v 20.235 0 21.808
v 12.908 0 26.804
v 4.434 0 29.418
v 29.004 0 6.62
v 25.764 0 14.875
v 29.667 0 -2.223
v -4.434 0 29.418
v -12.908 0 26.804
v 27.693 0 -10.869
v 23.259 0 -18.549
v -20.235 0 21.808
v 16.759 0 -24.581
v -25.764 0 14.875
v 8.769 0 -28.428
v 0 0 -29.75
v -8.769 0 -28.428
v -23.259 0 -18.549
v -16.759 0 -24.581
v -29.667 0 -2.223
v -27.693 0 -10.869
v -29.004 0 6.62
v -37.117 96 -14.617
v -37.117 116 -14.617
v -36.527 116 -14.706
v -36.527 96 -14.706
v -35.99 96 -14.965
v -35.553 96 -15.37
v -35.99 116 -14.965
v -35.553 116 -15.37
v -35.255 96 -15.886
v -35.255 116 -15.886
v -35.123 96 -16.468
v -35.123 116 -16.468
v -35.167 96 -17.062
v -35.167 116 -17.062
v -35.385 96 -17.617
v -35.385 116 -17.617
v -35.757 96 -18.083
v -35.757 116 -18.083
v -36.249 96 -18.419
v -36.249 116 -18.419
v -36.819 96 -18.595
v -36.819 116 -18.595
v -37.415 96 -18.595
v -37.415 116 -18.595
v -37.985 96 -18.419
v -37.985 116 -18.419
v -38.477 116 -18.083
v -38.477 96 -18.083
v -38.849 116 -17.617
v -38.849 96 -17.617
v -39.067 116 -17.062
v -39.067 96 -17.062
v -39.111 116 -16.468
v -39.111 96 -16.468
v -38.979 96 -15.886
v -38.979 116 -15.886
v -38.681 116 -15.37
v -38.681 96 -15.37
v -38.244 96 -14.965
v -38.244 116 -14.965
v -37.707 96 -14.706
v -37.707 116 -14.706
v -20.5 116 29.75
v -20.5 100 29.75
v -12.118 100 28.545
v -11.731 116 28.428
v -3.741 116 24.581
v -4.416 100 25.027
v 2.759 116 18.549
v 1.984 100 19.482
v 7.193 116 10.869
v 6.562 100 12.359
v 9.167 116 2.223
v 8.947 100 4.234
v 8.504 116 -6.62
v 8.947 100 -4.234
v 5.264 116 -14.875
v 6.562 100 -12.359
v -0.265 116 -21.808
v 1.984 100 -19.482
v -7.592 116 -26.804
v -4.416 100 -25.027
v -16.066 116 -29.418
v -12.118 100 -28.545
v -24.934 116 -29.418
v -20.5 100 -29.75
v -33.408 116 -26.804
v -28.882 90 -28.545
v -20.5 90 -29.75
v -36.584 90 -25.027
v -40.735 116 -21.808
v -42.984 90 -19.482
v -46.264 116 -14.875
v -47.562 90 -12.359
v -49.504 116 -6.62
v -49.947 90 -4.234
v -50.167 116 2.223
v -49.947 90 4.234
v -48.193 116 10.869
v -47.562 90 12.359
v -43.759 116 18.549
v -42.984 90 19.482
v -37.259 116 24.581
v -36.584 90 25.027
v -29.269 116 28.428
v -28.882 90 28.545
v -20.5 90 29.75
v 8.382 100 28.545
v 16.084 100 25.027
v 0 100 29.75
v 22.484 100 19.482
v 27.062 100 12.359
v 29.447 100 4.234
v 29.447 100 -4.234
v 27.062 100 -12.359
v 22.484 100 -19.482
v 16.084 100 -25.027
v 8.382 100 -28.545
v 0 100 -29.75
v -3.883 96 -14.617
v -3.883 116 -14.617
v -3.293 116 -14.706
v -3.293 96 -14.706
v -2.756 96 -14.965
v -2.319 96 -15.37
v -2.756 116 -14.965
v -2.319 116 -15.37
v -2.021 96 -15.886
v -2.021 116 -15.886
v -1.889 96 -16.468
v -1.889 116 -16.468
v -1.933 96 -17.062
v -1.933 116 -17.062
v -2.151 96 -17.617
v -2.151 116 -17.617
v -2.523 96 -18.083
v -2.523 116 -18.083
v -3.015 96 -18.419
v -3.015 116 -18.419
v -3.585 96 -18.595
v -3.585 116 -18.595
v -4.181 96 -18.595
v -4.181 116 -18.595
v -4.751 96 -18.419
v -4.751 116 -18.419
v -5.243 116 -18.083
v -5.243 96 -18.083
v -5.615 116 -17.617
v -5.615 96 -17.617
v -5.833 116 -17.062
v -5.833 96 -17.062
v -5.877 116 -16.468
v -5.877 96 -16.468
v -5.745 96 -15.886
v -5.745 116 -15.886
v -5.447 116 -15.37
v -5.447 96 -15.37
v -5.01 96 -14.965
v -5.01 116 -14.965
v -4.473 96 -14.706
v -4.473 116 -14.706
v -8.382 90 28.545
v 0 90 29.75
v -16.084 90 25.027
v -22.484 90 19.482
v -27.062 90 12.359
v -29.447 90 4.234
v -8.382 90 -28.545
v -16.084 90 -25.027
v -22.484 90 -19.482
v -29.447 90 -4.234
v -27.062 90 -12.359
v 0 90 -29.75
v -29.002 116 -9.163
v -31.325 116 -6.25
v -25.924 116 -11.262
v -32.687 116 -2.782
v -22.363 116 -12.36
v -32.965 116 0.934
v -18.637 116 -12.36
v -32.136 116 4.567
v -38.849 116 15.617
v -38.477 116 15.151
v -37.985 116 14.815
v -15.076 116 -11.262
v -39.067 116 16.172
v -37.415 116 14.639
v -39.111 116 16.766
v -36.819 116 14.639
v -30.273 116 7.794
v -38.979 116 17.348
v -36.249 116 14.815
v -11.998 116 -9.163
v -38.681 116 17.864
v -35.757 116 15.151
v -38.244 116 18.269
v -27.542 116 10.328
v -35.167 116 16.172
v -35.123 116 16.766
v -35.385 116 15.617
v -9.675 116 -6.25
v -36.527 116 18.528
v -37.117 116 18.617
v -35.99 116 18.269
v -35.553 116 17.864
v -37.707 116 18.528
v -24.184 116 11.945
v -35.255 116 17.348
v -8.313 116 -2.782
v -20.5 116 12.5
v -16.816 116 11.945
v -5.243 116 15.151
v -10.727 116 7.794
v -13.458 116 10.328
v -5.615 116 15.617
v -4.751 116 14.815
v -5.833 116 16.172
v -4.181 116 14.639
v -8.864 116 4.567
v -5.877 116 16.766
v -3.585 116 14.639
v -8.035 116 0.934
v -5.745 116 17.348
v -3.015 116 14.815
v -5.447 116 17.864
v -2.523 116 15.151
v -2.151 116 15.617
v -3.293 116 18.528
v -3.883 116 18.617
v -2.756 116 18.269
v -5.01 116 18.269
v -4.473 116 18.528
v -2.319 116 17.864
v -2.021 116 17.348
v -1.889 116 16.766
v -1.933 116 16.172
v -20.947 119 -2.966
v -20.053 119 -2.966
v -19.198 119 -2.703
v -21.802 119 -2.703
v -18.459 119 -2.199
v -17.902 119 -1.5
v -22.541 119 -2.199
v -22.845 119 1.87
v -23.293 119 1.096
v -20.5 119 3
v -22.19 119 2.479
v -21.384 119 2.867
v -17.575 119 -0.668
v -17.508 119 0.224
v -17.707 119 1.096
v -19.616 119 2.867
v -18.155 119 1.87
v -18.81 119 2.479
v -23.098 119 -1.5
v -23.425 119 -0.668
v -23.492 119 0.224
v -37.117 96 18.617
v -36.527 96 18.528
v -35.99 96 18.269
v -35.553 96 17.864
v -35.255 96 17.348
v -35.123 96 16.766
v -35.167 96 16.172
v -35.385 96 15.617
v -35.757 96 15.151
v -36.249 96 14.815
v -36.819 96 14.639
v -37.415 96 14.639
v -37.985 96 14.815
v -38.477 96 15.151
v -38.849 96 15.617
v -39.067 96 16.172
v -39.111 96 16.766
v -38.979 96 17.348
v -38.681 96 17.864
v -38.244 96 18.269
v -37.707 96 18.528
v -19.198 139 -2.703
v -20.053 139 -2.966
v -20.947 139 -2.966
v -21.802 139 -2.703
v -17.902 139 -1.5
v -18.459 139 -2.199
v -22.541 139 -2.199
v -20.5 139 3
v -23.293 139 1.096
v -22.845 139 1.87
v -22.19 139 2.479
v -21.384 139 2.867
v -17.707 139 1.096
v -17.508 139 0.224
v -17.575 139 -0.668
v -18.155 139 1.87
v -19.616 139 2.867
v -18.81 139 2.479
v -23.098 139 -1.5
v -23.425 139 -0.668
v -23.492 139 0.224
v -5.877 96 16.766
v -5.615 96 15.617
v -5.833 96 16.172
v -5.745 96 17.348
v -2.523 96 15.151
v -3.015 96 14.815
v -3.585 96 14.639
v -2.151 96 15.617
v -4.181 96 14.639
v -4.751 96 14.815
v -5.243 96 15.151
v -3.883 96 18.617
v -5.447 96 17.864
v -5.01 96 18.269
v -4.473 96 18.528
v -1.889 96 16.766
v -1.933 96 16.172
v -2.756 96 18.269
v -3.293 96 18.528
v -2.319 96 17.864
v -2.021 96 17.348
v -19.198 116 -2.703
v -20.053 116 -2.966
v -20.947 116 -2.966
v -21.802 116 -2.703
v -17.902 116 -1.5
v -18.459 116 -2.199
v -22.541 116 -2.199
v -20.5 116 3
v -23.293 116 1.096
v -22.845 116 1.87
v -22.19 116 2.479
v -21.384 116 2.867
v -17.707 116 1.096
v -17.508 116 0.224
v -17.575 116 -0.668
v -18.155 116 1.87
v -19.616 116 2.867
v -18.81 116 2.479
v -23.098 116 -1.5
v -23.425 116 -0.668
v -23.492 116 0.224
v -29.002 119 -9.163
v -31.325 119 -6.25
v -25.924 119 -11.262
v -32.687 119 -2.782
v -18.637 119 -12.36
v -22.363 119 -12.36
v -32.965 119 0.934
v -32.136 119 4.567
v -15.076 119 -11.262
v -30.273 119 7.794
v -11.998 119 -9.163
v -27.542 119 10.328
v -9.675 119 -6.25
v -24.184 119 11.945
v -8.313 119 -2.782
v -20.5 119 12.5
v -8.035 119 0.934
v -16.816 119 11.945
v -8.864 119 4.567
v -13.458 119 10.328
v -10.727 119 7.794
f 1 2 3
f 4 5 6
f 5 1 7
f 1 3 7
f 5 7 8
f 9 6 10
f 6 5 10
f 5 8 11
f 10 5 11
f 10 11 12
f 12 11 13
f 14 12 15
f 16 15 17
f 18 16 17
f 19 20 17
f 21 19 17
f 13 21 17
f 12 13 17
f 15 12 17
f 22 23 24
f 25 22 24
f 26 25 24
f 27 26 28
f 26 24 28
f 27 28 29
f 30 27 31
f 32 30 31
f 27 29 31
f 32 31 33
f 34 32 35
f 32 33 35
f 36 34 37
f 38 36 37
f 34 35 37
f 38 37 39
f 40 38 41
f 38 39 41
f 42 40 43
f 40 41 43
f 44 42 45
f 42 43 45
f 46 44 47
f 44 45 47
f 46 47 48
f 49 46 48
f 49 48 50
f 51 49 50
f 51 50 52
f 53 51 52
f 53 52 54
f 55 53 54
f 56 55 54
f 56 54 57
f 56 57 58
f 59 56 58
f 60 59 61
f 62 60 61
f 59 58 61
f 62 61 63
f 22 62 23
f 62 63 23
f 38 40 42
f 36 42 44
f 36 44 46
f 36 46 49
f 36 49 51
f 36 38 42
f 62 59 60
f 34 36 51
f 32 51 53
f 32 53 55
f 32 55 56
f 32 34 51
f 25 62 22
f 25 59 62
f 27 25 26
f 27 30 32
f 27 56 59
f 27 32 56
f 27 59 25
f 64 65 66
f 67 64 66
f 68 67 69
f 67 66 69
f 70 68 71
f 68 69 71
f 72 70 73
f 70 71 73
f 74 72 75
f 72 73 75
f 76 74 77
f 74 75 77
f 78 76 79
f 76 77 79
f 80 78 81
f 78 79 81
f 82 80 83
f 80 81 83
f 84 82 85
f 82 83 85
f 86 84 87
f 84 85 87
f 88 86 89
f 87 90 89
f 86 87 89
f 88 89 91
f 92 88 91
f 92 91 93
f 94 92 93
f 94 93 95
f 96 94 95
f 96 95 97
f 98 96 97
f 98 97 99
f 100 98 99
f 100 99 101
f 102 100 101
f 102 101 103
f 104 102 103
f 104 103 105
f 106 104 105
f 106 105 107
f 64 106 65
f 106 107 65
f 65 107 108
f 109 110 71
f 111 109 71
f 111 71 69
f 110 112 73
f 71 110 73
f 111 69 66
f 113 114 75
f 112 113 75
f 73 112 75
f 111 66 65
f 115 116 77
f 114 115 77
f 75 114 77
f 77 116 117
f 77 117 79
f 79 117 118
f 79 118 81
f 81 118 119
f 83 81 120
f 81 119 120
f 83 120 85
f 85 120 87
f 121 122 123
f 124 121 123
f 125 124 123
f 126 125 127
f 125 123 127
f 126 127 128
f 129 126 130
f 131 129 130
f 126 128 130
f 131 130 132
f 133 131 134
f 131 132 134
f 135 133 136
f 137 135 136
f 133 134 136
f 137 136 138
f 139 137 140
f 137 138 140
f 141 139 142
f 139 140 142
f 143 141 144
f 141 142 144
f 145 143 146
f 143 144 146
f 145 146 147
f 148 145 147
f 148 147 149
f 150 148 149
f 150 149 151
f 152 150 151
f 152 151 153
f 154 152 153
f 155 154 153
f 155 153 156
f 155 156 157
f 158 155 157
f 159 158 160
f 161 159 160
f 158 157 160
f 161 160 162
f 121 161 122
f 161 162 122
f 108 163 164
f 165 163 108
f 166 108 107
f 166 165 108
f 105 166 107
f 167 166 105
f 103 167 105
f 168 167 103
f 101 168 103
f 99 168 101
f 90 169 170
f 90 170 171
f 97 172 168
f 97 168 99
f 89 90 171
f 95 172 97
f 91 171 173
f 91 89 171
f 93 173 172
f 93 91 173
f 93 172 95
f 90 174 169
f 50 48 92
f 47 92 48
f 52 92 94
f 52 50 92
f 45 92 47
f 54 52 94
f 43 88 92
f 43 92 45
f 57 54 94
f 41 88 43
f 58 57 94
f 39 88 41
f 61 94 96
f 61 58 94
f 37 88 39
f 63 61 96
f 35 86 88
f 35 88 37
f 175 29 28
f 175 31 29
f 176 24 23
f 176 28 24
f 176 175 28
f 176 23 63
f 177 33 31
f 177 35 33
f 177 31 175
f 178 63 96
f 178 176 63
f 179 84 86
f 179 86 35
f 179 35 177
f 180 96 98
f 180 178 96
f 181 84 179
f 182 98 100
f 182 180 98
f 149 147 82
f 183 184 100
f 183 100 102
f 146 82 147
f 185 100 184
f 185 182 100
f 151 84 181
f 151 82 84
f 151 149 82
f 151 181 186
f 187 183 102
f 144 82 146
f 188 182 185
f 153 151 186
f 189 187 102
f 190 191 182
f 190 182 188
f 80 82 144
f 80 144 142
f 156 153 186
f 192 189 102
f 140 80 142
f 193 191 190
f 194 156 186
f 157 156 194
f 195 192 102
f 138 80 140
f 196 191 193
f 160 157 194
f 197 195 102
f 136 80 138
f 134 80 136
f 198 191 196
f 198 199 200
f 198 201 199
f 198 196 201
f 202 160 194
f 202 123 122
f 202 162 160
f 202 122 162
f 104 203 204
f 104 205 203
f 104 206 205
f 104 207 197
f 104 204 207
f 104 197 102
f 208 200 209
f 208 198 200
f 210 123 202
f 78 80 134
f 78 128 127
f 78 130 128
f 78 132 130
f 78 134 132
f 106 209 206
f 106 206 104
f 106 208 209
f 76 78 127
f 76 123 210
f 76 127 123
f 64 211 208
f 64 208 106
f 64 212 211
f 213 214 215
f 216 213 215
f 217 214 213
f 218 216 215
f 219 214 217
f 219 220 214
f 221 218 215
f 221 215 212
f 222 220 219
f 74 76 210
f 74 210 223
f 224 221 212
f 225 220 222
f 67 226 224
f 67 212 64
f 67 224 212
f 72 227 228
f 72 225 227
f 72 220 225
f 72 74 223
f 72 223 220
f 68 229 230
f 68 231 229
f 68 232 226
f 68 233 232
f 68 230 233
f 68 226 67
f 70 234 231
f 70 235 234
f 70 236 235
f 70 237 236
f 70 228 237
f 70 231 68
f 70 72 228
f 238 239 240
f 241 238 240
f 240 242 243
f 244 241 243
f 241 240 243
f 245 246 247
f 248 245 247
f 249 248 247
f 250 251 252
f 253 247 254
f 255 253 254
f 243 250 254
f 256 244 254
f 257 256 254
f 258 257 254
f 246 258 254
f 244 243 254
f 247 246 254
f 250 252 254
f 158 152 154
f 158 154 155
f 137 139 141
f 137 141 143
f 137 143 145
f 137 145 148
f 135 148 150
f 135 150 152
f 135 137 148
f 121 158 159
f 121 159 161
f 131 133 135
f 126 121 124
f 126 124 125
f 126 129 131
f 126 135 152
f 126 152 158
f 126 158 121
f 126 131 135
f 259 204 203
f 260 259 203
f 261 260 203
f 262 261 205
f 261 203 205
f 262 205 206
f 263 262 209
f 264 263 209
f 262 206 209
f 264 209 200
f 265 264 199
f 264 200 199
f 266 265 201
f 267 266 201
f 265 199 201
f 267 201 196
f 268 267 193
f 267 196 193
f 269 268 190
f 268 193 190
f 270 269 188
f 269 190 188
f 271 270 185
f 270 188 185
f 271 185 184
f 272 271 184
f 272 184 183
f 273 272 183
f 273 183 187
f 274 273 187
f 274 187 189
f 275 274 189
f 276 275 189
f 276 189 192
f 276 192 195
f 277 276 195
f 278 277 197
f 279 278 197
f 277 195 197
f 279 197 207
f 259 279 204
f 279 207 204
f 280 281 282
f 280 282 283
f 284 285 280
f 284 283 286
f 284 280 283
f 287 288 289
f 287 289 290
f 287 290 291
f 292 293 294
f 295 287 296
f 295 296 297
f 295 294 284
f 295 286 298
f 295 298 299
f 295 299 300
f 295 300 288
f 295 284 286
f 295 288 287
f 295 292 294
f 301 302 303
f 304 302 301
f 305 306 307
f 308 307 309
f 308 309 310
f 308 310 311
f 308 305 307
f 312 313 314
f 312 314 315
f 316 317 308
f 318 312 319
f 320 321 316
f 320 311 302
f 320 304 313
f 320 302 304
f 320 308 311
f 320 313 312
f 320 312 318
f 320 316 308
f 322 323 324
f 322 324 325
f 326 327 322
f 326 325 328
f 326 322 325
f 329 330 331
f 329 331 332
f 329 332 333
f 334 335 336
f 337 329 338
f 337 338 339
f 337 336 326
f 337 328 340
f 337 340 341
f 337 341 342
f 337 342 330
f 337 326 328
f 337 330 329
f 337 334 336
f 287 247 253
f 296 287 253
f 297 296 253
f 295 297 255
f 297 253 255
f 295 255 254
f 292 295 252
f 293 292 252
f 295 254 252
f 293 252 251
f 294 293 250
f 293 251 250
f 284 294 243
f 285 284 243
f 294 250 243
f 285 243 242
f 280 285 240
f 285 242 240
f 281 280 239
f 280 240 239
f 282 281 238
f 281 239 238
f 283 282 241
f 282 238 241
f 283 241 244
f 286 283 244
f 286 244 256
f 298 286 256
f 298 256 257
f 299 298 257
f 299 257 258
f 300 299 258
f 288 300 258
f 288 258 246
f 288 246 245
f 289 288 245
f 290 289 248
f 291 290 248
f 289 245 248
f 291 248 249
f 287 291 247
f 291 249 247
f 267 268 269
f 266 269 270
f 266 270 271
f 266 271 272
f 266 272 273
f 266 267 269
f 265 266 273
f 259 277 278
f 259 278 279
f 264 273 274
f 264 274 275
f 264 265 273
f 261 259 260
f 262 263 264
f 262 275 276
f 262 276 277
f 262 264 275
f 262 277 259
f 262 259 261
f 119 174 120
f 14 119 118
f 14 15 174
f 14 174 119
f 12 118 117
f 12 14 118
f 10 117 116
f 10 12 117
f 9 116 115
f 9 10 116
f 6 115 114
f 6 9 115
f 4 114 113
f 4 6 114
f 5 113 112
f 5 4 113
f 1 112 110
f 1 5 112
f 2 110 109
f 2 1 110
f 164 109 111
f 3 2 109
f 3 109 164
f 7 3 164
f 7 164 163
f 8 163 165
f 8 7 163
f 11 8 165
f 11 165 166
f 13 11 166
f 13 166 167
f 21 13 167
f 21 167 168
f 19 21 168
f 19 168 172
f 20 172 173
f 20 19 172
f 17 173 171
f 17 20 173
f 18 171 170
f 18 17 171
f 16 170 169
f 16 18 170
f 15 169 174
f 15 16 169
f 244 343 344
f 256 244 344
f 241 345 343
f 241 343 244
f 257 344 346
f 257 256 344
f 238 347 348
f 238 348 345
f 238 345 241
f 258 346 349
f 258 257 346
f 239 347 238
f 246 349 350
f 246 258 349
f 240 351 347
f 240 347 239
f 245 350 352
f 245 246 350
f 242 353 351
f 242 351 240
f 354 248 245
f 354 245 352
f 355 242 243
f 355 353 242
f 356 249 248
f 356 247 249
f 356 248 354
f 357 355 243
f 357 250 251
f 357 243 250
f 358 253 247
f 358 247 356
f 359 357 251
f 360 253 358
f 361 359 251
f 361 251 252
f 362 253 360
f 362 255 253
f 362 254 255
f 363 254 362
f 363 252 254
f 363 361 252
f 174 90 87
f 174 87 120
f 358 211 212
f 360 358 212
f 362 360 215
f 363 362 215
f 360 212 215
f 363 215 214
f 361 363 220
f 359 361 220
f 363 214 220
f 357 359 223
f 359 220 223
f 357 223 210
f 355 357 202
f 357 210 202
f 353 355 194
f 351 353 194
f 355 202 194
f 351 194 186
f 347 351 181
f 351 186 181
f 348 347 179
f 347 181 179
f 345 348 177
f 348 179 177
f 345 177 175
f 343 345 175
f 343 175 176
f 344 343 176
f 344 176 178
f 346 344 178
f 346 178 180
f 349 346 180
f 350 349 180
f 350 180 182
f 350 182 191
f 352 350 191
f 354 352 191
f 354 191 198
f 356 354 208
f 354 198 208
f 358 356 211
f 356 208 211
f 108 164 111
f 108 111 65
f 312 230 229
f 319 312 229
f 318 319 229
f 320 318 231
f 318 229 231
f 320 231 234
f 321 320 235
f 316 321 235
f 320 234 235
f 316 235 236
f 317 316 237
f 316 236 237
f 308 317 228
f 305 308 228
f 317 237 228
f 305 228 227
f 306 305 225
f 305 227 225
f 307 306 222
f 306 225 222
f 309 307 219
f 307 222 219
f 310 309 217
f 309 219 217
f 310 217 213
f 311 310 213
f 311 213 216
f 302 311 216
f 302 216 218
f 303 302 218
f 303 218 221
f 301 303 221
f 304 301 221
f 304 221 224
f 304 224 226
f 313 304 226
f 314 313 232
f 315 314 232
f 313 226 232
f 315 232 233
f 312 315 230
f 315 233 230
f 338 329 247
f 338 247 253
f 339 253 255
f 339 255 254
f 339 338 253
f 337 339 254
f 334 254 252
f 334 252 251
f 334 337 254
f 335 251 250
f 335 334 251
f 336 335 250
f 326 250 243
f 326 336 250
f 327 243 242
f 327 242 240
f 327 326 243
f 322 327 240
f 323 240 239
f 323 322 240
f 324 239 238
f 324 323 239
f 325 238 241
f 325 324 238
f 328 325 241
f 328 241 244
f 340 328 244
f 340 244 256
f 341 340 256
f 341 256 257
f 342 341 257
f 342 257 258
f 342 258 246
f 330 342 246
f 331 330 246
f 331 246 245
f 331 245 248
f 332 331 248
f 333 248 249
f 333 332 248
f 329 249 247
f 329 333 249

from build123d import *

# Parameters (mm, degrees)
SKETCH1_R           = 29.75
BOSS_EXTRUDE1_DEPTH = 90
BOSS_EXTRUDE2_DEPTH = 10
SKETCH3_R           = 29.75
BOSS_EXTRUDE3_DEPTH = 16
SKETCH4_R           = 12.5
SKETCH4_R_2         = 3
BOSS_EXTRUDE4_DEPTH = 3
SKETCH7_R           = 3
BOSS_EXTRUDE5_DEPTH = 20
SKETCH8_R           = 2
CUT_EXTRUDE1_DEPTH  = 20


with BuildPart() as part:
    # Sketch1 → Boss-Extrude1 (new body)
    with BuildSketch(Plane(origin=(0, 0, 0), x_dir=(1, 0, 0), z_dir=(0, 1, 0))):
        with Locations(Location((0, 0, 0), (0, 0, 90))):
            Circle(SKETCH1_R)
    extrude(amount=BOSS_EXTRUDE1_DEPTH)

    # Sketch2 → Boss-Extrude2 (add)
    with BuildSketch(Plane(origin=(0, 90, 0), x_dir=(1, 0, 0), z_dir=(0, 1, 0))):
        with BuildLine():
            Line((0, -29.75), (-20.5, -29.75))
            ThreePointArc((-20.5, -29.75), (-50.25, 0), (-20.5, 29.75))
            Line((-20.5, 29.75), (0, 29.75))
            ThreePointArc((0, 29.75), (29.75, 0), (0, -29.75))
        make_face()
    extrude(amount=BOSS_EXTRUDE2_DEPTH)

    # Sketch3 → Boss-Extrude3 (add)
    with BuildSketch(Plane(origin=(0, 100, 0), x_dir=(1, 0, 0), z_dir=(0, 1, 0))):
        with Locations(Location((-20.5, 0, 0), (0, 0, 270))):
            Circle(SKETCH3_R)
    extrude(amount=BOSS_EXTRUDE3_DEPTH)

    # Sketch4 → Boss-Extrude4 (add)
    with BuildSketch(Plane(origin=(0, 116, 0), x_dir=(1, 0, 0), z_dir=(0, 1, 0))):
        with Locations(Location((-20.5, 0, 0), (0, 0, 270))):
            Circle(SKETCH4_R)
        with Locations(Location((-20.5, 0, 0), (0, 0, 270))):
            Circle(SKETCH4_R_2, mode=Mode.SUBTRACT)
    extrude(amount=BOSS_EXTRUDE4_DEPTH)

    # Sketch8 → Cut-Extrude1 (cut)
    with BuildSketch(Plane(origin=(0, 116, 0), x_dir=(1, 0, 0), z_dir=(0, 1, 0))):
        with Locations(Location((-37.117009358, 16.617009358, 0), (0, 0, 270))):
            Circle(SKETCH8_R)
        with Locations(Location((-37.117009358, -16.617009358, 0), (0, 0, 270))):
            Circle(SKETCH8_R)
        with Locations(Location((-3.882990642, -16.617009358, 0), (0, 0, 270))):
            Circle(SKETCH8_R)
        with Locations(Location((-3.882990642, 16.617009358, 0), (0, 0, 270))):
            Circle(SKETCH8_R)
    extrude(amount=-CUT_EXTRUDE1_DEPTH, mode=Mode.SUBTRACT)


with BuildPart() as body_2:
    # Sketch7 → Boss-Extrude5 (new body)
    with BuildSketch(Plane(origin=(0, 119, 0), x_dir=(1, 0, 0), z_dir=(0, 1, 0))):
        with Locations(Location((-20.5, 0, 0), (0, 0, 270))):
            Circle(SKETCH7_R)
    extrude(amount=BOSS_EXTRUDE5_DEPTH)


solid = Compound([part.part, body_2.part])
